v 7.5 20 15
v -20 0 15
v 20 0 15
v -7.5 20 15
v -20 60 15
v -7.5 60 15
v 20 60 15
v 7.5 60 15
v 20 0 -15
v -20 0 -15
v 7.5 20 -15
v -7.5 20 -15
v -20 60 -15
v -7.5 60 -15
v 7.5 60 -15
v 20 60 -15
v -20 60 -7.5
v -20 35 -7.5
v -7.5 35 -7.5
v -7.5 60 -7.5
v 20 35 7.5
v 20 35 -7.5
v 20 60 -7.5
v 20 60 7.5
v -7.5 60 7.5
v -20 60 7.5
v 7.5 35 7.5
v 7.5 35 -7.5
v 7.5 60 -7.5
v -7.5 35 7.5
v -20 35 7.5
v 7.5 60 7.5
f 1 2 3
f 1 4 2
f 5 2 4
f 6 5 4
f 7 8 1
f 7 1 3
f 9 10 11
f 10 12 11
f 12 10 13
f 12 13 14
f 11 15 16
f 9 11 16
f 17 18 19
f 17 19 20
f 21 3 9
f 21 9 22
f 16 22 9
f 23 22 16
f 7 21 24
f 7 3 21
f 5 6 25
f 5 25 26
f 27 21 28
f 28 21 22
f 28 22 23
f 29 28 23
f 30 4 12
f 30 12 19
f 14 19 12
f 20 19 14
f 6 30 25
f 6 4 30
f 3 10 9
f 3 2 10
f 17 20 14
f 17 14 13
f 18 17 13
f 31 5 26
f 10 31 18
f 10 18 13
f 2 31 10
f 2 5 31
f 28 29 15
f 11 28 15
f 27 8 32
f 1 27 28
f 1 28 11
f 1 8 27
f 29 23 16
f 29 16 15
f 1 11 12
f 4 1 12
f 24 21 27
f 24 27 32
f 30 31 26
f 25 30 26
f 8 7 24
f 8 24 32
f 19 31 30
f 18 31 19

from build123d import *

# Parameters (mm, degrees)
SALIENTE_EXTRUIR1_DEPTH = 15
CORTAR_EXTRUIR1_REACH   = 75.655
CROQUIS2_W              = 15
CROQUIS2_H              = 25


with BuildPart() as part:
    # Croquis1 → Saliente-Extruir1 (new, symmetric)
    with BuildSketch(Plane.XY):
        Polygon((-20, 0), (20, 0), (20, 60), (7.5, 60), (7.5, 20), (-7.5, 20), (-7.5, 60), (-20, 60), align=None)
    extrude(amount=SALIENTE_EXTRUIR1_DEPTH, both=True)

    # Croquis2 → Cortar-Extruir1 (cut, up to next)
    with BuildSketch(Plane(origin=(20, 0, 0), x_dir=(0, 0, -1), z_dir=(1, 0, 0)), mode=Mode.PRIVATE) as cortar_extruir1_sk1:
        with Locations((0, 47.5)):
            Rectangle(CROQUIS2_W, CROQUIS2_H)
    cortar_extruir1_tool1 = extrude(cortar_extruir1_sk1.sketch, amount=-CORTAR_EXTRUIR1_REACH, mode=Mode.PRIVATE) & part.part
    cortar_extruir1 = cortar_extruir1_tool1.solids().sort_by_distance((20, 47.5, 0))[0]
    add(cortar_extruir1, mode=Mode.SUBTRACT)

    # Simetría1: Cortar-Extruir1 across plane
    add(cortar_extruir1.mirror(Plane(origin=(0, 0, 0), x_dir=(0, 0, 1), z_dir=(1, 0, 0))), mode=Mode.SUBTRACT)


solid = part.part
